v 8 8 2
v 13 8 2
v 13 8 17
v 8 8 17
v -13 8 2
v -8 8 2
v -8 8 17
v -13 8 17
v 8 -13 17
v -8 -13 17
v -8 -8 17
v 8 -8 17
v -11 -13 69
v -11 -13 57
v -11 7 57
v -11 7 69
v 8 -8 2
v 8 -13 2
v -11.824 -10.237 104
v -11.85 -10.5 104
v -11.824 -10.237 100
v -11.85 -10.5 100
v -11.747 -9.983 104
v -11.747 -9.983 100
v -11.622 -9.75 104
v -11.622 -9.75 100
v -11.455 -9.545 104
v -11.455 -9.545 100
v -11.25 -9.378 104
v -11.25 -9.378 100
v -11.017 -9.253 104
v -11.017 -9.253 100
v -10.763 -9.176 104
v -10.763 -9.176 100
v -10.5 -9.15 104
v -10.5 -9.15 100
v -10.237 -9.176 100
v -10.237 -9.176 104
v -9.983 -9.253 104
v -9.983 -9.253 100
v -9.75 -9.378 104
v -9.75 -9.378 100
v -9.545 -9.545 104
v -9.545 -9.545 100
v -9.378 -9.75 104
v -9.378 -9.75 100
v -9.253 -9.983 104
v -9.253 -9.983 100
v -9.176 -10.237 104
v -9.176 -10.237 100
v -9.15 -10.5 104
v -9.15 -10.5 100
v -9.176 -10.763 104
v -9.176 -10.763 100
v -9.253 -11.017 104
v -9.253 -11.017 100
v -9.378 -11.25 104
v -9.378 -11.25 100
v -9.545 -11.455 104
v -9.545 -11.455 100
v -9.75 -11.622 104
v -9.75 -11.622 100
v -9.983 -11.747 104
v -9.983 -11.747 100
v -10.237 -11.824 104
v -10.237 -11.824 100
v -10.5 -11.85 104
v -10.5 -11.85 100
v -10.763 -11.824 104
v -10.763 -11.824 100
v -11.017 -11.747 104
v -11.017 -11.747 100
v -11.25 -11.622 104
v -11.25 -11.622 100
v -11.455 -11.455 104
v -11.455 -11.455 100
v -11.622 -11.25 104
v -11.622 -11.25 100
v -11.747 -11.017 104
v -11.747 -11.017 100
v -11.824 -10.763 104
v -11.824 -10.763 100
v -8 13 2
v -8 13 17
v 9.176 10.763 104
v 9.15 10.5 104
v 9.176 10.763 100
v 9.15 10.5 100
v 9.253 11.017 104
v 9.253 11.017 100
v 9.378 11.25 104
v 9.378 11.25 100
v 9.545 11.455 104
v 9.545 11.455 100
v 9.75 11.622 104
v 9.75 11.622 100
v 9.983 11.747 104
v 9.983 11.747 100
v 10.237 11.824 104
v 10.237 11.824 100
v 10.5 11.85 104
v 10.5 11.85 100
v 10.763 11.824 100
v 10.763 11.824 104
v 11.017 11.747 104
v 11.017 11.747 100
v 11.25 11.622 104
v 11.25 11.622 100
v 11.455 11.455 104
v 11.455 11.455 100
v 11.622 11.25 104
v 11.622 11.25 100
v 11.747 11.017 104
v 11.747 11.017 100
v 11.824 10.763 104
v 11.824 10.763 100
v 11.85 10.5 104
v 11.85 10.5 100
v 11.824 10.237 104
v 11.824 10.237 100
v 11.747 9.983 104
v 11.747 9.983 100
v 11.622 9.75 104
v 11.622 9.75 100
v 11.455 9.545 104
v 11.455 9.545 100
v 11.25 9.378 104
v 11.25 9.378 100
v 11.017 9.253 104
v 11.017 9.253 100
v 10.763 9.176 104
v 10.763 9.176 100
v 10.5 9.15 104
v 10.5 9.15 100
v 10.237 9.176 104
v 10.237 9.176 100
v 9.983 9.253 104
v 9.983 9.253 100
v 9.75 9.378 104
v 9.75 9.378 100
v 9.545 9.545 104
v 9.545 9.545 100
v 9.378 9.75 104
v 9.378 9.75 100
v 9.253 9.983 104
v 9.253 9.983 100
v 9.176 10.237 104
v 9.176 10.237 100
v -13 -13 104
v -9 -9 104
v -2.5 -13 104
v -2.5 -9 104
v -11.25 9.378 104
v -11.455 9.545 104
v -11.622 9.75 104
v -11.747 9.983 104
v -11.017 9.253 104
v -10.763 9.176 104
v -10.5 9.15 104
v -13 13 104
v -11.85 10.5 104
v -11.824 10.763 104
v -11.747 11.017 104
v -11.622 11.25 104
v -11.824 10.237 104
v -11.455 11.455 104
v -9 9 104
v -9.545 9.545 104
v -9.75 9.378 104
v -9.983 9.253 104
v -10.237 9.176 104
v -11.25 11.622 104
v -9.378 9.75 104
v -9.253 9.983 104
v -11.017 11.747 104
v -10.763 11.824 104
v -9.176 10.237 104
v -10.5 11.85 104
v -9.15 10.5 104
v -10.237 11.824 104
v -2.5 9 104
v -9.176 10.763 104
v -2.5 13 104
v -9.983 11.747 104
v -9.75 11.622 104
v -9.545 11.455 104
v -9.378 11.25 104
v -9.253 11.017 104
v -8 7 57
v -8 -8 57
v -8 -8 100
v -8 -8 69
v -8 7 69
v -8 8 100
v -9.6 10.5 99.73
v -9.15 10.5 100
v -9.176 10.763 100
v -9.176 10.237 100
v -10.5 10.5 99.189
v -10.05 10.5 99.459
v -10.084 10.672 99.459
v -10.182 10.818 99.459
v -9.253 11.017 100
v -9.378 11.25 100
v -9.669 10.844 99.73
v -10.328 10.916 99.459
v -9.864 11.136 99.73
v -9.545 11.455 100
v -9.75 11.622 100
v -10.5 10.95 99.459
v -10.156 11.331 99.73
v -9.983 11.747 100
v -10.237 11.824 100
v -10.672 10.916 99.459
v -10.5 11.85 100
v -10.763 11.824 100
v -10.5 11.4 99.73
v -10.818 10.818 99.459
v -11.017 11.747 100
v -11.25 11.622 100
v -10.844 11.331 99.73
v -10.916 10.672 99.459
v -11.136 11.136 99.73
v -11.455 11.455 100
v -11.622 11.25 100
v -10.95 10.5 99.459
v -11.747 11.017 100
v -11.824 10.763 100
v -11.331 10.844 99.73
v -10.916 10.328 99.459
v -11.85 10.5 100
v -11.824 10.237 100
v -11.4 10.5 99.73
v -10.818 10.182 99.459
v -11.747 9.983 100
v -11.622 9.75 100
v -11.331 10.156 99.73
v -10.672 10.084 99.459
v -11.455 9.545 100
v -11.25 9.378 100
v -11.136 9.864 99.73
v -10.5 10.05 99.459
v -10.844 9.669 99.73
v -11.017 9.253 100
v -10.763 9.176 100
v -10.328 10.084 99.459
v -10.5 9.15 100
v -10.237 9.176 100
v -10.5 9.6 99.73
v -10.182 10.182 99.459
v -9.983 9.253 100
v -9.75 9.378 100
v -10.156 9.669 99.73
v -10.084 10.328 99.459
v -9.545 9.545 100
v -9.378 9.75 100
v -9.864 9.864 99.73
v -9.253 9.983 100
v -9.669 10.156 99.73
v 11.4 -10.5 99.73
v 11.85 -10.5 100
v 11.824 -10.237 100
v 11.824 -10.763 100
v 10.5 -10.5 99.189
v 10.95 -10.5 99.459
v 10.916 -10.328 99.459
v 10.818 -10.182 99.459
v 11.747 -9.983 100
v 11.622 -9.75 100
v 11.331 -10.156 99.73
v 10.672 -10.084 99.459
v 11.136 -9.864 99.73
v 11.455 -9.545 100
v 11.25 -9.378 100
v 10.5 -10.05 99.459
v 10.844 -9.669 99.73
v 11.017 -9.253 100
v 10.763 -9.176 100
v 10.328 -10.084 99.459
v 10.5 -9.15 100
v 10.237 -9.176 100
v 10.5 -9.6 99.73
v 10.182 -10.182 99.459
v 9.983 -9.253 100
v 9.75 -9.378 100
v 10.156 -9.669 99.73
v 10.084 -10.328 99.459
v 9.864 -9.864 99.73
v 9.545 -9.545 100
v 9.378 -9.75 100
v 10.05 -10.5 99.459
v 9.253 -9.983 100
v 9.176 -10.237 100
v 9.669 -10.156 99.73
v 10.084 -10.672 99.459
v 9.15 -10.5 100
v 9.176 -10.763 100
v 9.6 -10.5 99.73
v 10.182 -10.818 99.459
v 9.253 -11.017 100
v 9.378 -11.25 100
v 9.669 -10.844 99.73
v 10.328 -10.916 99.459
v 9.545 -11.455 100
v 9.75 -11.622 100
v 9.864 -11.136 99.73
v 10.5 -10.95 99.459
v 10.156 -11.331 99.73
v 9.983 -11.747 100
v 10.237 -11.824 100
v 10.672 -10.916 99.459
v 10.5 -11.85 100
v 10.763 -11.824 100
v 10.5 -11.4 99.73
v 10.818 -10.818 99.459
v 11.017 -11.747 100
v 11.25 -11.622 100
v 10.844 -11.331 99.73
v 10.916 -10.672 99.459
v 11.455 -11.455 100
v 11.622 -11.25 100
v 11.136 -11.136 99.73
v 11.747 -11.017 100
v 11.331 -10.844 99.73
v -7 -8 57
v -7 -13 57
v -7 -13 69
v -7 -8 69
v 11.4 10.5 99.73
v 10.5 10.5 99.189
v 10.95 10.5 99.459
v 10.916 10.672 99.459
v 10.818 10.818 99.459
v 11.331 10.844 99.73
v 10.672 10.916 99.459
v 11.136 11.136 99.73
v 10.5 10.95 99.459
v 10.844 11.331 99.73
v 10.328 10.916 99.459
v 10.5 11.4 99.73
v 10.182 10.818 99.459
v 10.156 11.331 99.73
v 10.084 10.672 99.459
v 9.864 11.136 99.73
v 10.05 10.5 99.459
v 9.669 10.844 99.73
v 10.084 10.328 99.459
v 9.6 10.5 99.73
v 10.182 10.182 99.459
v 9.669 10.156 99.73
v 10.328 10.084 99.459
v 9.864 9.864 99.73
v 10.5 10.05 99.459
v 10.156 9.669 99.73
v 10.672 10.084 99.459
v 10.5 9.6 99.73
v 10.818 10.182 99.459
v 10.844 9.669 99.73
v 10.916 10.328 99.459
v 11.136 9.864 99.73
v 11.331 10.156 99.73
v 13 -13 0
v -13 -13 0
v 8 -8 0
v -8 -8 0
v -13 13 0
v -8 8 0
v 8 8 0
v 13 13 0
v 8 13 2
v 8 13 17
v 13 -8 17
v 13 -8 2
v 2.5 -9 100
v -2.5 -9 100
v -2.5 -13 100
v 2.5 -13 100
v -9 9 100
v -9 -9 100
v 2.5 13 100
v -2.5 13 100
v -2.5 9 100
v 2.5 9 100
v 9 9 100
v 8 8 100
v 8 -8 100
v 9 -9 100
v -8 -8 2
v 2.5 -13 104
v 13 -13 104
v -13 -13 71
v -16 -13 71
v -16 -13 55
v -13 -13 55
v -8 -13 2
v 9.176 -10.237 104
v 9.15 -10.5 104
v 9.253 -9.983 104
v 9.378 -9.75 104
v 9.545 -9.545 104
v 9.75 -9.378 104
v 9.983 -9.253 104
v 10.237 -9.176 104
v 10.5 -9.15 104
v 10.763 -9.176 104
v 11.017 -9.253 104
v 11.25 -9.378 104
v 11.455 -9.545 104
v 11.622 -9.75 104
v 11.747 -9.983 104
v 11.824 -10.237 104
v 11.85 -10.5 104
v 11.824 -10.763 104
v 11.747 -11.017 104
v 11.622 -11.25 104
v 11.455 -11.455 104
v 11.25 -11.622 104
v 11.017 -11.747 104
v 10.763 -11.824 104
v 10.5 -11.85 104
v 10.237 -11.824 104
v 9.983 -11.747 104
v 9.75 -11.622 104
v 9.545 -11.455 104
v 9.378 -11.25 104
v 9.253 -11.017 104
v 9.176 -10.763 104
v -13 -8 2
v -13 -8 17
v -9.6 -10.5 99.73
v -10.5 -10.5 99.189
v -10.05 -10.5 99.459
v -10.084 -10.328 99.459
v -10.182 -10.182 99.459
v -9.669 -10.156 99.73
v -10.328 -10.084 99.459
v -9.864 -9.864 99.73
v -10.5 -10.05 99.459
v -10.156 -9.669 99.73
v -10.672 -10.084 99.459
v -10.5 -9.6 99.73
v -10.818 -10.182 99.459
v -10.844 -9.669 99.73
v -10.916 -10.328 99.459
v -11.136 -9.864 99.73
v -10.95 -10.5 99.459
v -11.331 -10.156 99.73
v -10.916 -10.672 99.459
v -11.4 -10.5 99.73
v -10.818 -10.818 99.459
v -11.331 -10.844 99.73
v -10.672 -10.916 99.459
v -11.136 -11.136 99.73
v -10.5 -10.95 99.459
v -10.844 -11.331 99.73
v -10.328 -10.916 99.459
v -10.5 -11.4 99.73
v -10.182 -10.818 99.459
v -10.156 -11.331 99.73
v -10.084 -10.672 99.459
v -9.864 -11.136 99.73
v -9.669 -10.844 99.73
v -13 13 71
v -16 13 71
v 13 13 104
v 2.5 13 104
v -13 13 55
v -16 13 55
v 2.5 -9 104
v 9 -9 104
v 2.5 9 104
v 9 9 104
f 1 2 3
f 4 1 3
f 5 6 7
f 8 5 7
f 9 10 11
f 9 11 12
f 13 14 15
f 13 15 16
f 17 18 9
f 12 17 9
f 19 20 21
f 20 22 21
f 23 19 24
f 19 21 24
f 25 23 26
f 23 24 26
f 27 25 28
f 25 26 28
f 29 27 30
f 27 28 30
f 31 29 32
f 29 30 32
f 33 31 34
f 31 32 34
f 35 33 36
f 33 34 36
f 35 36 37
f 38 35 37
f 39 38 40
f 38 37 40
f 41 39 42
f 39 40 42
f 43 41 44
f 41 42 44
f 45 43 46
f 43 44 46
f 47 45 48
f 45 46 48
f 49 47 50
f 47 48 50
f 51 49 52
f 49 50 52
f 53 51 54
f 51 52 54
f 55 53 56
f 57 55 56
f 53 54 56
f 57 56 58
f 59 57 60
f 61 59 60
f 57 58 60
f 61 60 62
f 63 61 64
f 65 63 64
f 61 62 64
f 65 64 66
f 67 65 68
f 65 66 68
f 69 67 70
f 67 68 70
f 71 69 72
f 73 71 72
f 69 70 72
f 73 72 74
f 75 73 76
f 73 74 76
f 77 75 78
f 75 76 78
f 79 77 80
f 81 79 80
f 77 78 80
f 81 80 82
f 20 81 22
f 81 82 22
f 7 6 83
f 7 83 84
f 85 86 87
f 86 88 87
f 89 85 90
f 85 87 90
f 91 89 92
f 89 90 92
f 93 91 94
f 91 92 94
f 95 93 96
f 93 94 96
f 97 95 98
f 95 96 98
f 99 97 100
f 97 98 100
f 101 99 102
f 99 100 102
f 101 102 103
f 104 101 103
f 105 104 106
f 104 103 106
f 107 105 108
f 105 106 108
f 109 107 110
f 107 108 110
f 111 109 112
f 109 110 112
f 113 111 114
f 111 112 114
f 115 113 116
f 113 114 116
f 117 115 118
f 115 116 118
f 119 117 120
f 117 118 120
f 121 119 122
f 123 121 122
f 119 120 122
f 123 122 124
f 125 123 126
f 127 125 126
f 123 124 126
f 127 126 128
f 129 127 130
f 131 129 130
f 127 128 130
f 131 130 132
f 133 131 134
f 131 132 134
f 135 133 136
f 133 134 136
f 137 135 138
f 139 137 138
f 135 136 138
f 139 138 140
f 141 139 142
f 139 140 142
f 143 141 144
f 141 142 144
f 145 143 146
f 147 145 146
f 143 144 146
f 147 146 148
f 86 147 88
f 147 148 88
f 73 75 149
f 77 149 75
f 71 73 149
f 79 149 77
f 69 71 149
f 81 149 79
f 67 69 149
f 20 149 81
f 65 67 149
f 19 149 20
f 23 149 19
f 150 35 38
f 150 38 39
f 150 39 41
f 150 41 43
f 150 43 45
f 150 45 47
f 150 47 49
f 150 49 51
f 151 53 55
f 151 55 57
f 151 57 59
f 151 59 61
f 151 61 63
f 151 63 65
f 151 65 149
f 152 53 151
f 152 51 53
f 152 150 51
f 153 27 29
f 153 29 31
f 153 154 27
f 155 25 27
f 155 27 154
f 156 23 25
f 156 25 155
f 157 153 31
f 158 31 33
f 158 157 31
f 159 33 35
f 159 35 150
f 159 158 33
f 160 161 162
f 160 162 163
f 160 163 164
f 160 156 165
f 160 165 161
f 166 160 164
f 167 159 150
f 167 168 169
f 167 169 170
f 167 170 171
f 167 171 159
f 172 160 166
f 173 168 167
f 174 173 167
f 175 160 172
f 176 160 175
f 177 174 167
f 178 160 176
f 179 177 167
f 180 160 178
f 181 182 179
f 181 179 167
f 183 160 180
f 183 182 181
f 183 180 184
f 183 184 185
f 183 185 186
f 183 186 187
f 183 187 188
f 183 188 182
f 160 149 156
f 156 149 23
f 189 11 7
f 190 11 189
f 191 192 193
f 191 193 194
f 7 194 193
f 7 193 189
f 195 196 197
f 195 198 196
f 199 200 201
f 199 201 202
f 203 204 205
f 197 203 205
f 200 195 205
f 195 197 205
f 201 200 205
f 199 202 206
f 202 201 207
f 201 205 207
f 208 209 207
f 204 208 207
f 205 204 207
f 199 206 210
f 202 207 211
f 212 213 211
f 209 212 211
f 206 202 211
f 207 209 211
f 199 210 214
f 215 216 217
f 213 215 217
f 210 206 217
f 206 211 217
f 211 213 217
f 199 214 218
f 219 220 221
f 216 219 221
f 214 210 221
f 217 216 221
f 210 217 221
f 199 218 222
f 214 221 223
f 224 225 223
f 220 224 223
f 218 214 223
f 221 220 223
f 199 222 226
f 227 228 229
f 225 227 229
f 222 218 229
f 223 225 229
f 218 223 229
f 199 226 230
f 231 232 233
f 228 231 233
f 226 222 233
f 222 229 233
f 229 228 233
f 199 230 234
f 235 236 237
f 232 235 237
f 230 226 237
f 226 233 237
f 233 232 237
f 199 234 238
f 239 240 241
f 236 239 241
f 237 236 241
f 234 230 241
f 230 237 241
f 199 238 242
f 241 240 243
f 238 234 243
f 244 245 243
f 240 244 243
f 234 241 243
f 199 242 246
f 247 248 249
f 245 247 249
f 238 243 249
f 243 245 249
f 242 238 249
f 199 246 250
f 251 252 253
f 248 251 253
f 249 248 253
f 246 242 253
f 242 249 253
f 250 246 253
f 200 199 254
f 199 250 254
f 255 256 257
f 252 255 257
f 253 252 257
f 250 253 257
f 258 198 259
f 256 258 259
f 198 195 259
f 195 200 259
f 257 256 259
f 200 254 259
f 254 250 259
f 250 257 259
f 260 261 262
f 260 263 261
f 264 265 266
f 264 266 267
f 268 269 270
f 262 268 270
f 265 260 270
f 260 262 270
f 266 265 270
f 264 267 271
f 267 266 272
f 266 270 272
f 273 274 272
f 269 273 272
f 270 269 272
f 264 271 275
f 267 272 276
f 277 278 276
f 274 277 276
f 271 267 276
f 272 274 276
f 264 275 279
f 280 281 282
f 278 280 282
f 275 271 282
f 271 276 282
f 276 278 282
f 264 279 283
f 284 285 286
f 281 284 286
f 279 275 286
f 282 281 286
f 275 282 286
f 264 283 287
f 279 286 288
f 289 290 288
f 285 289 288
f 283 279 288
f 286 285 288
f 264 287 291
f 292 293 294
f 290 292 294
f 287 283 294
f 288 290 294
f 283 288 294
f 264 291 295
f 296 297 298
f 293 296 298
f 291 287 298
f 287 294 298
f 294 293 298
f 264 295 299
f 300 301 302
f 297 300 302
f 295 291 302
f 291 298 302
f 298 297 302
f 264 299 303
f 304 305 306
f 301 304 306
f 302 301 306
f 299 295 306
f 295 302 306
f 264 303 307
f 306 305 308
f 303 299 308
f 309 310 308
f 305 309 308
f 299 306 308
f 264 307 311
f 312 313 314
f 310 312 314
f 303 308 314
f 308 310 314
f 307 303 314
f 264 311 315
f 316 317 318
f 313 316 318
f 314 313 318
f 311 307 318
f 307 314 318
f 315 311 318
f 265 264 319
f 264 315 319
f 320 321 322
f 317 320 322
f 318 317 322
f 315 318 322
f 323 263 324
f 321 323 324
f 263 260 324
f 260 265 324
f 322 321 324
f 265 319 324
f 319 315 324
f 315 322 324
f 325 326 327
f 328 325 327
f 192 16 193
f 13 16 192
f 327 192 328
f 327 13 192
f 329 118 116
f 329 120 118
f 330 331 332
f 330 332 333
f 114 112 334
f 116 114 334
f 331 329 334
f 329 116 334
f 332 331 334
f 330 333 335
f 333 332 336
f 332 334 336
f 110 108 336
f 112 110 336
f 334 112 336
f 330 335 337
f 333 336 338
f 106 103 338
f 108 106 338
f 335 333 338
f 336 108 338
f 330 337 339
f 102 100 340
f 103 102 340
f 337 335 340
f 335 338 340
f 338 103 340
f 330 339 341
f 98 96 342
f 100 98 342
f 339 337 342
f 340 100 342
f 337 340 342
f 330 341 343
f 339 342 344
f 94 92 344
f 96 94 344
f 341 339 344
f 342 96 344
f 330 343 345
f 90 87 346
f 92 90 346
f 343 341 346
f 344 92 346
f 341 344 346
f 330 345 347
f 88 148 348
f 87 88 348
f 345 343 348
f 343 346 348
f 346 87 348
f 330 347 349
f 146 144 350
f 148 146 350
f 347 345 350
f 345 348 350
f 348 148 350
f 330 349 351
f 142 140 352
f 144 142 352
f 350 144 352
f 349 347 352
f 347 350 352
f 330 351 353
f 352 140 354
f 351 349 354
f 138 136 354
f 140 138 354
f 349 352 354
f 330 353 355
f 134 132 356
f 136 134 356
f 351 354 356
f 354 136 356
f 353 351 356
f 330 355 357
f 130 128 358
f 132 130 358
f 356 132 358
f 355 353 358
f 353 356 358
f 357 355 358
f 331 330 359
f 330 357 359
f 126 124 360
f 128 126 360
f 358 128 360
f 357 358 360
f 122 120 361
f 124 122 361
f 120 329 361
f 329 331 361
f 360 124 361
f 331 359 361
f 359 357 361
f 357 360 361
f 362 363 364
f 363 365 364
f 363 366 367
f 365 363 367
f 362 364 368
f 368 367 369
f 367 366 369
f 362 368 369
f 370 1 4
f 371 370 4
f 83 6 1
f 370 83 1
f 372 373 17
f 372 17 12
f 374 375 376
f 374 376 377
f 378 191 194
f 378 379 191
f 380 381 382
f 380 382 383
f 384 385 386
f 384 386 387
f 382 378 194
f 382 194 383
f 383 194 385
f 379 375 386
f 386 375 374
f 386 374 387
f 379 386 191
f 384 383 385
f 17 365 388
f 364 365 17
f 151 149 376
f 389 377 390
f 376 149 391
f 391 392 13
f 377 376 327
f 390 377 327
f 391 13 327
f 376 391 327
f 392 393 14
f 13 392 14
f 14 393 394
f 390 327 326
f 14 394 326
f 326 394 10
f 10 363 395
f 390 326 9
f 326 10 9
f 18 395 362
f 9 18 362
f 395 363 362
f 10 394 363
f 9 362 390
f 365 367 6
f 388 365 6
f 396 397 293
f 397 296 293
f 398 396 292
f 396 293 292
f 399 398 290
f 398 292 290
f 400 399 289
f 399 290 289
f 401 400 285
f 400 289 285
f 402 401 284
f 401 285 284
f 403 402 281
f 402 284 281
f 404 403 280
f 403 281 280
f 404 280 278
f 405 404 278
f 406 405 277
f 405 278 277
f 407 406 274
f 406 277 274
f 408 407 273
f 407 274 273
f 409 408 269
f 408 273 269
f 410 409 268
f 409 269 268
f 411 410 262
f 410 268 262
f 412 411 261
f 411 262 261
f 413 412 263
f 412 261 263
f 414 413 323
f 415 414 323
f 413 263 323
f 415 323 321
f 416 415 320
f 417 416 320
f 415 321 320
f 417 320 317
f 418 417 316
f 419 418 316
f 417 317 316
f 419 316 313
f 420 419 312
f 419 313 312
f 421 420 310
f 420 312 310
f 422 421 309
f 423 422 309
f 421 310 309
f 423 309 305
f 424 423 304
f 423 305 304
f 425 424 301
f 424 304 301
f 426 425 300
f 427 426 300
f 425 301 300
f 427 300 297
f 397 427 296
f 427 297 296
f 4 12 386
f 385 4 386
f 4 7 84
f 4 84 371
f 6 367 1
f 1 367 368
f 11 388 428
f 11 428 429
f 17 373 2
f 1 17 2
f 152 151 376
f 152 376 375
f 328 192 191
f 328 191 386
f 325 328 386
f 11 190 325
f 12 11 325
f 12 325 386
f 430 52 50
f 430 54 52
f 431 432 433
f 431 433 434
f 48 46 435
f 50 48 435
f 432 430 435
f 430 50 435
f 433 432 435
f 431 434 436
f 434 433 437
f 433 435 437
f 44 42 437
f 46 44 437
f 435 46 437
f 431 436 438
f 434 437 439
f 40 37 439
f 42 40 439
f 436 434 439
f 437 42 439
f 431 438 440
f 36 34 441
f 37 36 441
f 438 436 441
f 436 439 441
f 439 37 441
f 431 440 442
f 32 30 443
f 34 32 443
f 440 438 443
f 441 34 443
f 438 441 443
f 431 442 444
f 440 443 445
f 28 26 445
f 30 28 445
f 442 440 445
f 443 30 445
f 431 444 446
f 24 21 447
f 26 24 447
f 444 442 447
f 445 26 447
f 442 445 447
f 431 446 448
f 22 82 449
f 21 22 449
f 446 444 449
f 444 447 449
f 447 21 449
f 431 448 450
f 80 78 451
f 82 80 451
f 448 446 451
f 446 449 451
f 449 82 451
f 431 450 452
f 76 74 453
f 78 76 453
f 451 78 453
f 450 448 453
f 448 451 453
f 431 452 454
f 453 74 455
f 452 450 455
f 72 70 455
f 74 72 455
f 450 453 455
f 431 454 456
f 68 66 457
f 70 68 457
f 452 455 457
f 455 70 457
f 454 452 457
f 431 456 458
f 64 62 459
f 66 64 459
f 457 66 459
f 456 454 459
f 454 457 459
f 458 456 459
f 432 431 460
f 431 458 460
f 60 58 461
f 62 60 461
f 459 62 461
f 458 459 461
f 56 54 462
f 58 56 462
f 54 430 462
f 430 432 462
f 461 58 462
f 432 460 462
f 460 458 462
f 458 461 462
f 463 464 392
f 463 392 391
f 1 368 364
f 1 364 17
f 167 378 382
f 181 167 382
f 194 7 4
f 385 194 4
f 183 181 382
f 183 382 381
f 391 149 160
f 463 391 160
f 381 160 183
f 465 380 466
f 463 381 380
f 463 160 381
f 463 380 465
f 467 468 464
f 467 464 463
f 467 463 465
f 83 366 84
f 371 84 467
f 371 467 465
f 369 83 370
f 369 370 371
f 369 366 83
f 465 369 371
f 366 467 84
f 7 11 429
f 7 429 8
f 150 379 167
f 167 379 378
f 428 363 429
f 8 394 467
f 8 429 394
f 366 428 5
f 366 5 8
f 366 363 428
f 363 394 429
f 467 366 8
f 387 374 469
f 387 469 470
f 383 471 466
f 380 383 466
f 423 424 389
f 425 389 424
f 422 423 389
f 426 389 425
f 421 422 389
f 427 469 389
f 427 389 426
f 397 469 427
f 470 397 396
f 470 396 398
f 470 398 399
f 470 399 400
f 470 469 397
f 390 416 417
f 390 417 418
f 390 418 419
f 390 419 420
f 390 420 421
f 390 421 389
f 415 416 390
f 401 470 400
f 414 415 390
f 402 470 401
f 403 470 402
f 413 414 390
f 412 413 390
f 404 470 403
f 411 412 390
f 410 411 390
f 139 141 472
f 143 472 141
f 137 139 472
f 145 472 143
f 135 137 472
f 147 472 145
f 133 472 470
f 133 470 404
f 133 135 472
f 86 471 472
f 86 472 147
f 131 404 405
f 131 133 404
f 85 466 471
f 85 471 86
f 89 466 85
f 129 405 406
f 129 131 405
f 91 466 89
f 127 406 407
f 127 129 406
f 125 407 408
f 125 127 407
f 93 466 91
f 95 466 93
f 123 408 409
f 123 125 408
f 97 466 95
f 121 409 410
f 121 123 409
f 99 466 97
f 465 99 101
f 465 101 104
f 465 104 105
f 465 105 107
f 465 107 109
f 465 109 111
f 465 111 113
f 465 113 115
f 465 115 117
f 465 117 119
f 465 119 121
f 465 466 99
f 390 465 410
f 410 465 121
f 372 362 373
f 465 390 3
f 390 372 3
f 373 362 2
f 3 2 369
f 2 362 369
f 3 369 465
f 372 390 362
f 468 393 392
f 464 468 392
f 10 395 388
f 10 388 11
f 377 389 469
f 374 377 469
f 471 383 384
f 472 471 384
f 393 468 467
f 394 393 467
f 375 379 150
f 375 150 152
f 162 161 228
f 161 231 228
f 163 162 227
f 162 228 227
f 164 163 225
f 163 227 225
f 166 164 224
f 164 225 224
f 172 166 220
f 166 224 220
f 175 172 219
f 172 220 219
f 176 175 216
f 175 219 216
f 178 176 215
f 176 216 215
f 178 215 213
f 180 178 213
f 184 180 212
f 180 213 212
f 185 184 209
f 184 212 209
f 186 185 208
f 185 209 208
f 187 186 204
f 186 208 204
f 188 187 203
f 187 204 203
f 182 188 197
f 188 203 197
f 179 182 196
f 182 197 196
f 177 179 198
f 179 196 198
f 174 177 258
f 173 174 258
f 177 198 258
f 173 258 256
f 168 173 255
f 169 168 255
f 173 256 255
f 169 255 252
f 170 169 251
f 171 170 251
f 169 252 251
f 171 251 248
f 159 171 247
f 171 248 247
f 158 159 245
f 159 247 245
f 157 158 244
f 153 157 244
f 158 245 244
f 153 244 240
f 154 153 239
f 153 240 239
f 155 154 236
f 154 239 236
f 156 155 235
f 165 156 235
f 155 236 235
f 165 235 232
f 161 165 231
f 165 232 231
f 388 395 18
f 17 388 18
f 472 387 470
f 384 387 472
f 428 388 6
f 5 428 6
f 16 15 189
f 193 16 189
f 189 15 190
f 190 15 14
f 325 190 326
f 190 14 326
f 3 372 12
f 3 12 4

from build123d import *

# Parameters (mm, degrees)
F0_W      = 26
F0_H      = 26
F0_W_2    = 16
F0_H_2    = 16
F1_DEPTH  = 2
F2_DEPTH  = 100
F3_W      = 26
F3_H      = 26
F3_W_2    = 18
F3_H_2    = 18
F4_DEPTH  = 4
F5_W      = 5
F5_H      = 4
F6_DEPTH  = 4
F7_D      = 2.7
F7_DEPTH  = 4
F7_TIP    = 0.8111618357
F9_DEPTH  = 25
F10_W     = 3
F10_H     = 16
F11_DEPTH = 26
F12_W     = 4
F12_H     = 12
F13_DEPTH = 20
F14_W     = 16
F14_H     = 15
F15_DEPTH = 40
F16_W     = 16
F16_H     = 15
F17_DEPTH = 40


with BuildPart() as f1:
    # F0 (on Top) → F1 (new body)
    with BuildSketch(Plane.XY):
        Rectangle(F0_W, F0_H)
        Rectangle(F0_W_2, F0_H_2, mode=Mode.SUBTRACT)
        Rectangle(F0_W_2, F0_H_2)
    extrude(amount=F1_DEPTH)

    # F0 (on Top) → F2 (join)
    with BuildSketch(Plane.XY):
        Rectangle(F0_W, F0_H)
        Rectangle(F0_W_2, F0_H_2, mode=Mode.SUBTRACT)
    extrude(amount=F2_DEPTH)

    # F3 (on face) → F4 (join)
    with BuildSketch(Plane.XY.offset(100)):
        Rectangle(F3_W, F3_H)
        Rectangle(F3_W_2, F3_H_2, mode=Mode.SUBTRACT)
    extrude(amount=F4_DEPTH)

    # F5 (on face) → F6 (cut, through all)
    with BuildSketch(Plane.XY.offset(104)):
        with Locations((0, -11)):
            Rectangle(F5_W, F5_H)
        with Locations((0, 11)):
            Rectangle(F5_W, F5_H)
    extrude(amount=-F6_DEPTH, mode=Mode.SUBTRACT)

    # F7
    with Locations(Plane.XY.offset(104)):
        with Locations((-10.5, 10.5), (10.5, 10.5), (-10.5, -10.5), (10.5, -10.5)):
            Hole(F7_D / 2, depth=F7_DEPTH)
            with Locations((0, 0, -(F7_DEPTH + F7_TIP / 2))):  # 118° drill point
                Cone(0, F7_D / 2, F7_TIP, mode=Mode.SUBTRACT)

    # F0 (on Top) → F9 (cut)
    with BuildSketch(Plane.XY):
        Rectangle(F0_W_2, F0_H_2)
    extrude(amount=F9_DEPTH, mode=Mode.SUBTRACT)

    # F10 (on face) → F11 (join)
    with BuildSketch(Plane.XZ.offset(13)):
        with Locations((-14.5, 63)):
            Rectangle(F10_W, F10_H)
    extrude(amount=-F11_DEPTH)

    # F12 (on face) → F13 (cut)
    with BuildSketch(Plane.XZ.offset(13)):
        with Locations((-9, 63)):
            Rectangle(F12_W, F12_H)
    extrude(amount=-F13_DEPTH, mode=Mode.SUBTRACT)

    # F14 (on face) → F15 (cut)
    with BuildSketch(Plane.XZ.offset(13)):
        with Locations((0, 9.5)):
            Rectangle(F14_W, F14_H)
    extrude(amount=-F15_DEPTH, mode=Mode.SUBTRACT)

    # F16 (on face) → F17 (cut)
    with BuildSketch(Plane.YZ.offset(13)):
        with Locations((0, 9.5)):
            Rectangle(F16_W, F16_H)
    extrude(amount=-F17_DEPTH, mode=Mode.SUBTRACT)


solid = f1.part
